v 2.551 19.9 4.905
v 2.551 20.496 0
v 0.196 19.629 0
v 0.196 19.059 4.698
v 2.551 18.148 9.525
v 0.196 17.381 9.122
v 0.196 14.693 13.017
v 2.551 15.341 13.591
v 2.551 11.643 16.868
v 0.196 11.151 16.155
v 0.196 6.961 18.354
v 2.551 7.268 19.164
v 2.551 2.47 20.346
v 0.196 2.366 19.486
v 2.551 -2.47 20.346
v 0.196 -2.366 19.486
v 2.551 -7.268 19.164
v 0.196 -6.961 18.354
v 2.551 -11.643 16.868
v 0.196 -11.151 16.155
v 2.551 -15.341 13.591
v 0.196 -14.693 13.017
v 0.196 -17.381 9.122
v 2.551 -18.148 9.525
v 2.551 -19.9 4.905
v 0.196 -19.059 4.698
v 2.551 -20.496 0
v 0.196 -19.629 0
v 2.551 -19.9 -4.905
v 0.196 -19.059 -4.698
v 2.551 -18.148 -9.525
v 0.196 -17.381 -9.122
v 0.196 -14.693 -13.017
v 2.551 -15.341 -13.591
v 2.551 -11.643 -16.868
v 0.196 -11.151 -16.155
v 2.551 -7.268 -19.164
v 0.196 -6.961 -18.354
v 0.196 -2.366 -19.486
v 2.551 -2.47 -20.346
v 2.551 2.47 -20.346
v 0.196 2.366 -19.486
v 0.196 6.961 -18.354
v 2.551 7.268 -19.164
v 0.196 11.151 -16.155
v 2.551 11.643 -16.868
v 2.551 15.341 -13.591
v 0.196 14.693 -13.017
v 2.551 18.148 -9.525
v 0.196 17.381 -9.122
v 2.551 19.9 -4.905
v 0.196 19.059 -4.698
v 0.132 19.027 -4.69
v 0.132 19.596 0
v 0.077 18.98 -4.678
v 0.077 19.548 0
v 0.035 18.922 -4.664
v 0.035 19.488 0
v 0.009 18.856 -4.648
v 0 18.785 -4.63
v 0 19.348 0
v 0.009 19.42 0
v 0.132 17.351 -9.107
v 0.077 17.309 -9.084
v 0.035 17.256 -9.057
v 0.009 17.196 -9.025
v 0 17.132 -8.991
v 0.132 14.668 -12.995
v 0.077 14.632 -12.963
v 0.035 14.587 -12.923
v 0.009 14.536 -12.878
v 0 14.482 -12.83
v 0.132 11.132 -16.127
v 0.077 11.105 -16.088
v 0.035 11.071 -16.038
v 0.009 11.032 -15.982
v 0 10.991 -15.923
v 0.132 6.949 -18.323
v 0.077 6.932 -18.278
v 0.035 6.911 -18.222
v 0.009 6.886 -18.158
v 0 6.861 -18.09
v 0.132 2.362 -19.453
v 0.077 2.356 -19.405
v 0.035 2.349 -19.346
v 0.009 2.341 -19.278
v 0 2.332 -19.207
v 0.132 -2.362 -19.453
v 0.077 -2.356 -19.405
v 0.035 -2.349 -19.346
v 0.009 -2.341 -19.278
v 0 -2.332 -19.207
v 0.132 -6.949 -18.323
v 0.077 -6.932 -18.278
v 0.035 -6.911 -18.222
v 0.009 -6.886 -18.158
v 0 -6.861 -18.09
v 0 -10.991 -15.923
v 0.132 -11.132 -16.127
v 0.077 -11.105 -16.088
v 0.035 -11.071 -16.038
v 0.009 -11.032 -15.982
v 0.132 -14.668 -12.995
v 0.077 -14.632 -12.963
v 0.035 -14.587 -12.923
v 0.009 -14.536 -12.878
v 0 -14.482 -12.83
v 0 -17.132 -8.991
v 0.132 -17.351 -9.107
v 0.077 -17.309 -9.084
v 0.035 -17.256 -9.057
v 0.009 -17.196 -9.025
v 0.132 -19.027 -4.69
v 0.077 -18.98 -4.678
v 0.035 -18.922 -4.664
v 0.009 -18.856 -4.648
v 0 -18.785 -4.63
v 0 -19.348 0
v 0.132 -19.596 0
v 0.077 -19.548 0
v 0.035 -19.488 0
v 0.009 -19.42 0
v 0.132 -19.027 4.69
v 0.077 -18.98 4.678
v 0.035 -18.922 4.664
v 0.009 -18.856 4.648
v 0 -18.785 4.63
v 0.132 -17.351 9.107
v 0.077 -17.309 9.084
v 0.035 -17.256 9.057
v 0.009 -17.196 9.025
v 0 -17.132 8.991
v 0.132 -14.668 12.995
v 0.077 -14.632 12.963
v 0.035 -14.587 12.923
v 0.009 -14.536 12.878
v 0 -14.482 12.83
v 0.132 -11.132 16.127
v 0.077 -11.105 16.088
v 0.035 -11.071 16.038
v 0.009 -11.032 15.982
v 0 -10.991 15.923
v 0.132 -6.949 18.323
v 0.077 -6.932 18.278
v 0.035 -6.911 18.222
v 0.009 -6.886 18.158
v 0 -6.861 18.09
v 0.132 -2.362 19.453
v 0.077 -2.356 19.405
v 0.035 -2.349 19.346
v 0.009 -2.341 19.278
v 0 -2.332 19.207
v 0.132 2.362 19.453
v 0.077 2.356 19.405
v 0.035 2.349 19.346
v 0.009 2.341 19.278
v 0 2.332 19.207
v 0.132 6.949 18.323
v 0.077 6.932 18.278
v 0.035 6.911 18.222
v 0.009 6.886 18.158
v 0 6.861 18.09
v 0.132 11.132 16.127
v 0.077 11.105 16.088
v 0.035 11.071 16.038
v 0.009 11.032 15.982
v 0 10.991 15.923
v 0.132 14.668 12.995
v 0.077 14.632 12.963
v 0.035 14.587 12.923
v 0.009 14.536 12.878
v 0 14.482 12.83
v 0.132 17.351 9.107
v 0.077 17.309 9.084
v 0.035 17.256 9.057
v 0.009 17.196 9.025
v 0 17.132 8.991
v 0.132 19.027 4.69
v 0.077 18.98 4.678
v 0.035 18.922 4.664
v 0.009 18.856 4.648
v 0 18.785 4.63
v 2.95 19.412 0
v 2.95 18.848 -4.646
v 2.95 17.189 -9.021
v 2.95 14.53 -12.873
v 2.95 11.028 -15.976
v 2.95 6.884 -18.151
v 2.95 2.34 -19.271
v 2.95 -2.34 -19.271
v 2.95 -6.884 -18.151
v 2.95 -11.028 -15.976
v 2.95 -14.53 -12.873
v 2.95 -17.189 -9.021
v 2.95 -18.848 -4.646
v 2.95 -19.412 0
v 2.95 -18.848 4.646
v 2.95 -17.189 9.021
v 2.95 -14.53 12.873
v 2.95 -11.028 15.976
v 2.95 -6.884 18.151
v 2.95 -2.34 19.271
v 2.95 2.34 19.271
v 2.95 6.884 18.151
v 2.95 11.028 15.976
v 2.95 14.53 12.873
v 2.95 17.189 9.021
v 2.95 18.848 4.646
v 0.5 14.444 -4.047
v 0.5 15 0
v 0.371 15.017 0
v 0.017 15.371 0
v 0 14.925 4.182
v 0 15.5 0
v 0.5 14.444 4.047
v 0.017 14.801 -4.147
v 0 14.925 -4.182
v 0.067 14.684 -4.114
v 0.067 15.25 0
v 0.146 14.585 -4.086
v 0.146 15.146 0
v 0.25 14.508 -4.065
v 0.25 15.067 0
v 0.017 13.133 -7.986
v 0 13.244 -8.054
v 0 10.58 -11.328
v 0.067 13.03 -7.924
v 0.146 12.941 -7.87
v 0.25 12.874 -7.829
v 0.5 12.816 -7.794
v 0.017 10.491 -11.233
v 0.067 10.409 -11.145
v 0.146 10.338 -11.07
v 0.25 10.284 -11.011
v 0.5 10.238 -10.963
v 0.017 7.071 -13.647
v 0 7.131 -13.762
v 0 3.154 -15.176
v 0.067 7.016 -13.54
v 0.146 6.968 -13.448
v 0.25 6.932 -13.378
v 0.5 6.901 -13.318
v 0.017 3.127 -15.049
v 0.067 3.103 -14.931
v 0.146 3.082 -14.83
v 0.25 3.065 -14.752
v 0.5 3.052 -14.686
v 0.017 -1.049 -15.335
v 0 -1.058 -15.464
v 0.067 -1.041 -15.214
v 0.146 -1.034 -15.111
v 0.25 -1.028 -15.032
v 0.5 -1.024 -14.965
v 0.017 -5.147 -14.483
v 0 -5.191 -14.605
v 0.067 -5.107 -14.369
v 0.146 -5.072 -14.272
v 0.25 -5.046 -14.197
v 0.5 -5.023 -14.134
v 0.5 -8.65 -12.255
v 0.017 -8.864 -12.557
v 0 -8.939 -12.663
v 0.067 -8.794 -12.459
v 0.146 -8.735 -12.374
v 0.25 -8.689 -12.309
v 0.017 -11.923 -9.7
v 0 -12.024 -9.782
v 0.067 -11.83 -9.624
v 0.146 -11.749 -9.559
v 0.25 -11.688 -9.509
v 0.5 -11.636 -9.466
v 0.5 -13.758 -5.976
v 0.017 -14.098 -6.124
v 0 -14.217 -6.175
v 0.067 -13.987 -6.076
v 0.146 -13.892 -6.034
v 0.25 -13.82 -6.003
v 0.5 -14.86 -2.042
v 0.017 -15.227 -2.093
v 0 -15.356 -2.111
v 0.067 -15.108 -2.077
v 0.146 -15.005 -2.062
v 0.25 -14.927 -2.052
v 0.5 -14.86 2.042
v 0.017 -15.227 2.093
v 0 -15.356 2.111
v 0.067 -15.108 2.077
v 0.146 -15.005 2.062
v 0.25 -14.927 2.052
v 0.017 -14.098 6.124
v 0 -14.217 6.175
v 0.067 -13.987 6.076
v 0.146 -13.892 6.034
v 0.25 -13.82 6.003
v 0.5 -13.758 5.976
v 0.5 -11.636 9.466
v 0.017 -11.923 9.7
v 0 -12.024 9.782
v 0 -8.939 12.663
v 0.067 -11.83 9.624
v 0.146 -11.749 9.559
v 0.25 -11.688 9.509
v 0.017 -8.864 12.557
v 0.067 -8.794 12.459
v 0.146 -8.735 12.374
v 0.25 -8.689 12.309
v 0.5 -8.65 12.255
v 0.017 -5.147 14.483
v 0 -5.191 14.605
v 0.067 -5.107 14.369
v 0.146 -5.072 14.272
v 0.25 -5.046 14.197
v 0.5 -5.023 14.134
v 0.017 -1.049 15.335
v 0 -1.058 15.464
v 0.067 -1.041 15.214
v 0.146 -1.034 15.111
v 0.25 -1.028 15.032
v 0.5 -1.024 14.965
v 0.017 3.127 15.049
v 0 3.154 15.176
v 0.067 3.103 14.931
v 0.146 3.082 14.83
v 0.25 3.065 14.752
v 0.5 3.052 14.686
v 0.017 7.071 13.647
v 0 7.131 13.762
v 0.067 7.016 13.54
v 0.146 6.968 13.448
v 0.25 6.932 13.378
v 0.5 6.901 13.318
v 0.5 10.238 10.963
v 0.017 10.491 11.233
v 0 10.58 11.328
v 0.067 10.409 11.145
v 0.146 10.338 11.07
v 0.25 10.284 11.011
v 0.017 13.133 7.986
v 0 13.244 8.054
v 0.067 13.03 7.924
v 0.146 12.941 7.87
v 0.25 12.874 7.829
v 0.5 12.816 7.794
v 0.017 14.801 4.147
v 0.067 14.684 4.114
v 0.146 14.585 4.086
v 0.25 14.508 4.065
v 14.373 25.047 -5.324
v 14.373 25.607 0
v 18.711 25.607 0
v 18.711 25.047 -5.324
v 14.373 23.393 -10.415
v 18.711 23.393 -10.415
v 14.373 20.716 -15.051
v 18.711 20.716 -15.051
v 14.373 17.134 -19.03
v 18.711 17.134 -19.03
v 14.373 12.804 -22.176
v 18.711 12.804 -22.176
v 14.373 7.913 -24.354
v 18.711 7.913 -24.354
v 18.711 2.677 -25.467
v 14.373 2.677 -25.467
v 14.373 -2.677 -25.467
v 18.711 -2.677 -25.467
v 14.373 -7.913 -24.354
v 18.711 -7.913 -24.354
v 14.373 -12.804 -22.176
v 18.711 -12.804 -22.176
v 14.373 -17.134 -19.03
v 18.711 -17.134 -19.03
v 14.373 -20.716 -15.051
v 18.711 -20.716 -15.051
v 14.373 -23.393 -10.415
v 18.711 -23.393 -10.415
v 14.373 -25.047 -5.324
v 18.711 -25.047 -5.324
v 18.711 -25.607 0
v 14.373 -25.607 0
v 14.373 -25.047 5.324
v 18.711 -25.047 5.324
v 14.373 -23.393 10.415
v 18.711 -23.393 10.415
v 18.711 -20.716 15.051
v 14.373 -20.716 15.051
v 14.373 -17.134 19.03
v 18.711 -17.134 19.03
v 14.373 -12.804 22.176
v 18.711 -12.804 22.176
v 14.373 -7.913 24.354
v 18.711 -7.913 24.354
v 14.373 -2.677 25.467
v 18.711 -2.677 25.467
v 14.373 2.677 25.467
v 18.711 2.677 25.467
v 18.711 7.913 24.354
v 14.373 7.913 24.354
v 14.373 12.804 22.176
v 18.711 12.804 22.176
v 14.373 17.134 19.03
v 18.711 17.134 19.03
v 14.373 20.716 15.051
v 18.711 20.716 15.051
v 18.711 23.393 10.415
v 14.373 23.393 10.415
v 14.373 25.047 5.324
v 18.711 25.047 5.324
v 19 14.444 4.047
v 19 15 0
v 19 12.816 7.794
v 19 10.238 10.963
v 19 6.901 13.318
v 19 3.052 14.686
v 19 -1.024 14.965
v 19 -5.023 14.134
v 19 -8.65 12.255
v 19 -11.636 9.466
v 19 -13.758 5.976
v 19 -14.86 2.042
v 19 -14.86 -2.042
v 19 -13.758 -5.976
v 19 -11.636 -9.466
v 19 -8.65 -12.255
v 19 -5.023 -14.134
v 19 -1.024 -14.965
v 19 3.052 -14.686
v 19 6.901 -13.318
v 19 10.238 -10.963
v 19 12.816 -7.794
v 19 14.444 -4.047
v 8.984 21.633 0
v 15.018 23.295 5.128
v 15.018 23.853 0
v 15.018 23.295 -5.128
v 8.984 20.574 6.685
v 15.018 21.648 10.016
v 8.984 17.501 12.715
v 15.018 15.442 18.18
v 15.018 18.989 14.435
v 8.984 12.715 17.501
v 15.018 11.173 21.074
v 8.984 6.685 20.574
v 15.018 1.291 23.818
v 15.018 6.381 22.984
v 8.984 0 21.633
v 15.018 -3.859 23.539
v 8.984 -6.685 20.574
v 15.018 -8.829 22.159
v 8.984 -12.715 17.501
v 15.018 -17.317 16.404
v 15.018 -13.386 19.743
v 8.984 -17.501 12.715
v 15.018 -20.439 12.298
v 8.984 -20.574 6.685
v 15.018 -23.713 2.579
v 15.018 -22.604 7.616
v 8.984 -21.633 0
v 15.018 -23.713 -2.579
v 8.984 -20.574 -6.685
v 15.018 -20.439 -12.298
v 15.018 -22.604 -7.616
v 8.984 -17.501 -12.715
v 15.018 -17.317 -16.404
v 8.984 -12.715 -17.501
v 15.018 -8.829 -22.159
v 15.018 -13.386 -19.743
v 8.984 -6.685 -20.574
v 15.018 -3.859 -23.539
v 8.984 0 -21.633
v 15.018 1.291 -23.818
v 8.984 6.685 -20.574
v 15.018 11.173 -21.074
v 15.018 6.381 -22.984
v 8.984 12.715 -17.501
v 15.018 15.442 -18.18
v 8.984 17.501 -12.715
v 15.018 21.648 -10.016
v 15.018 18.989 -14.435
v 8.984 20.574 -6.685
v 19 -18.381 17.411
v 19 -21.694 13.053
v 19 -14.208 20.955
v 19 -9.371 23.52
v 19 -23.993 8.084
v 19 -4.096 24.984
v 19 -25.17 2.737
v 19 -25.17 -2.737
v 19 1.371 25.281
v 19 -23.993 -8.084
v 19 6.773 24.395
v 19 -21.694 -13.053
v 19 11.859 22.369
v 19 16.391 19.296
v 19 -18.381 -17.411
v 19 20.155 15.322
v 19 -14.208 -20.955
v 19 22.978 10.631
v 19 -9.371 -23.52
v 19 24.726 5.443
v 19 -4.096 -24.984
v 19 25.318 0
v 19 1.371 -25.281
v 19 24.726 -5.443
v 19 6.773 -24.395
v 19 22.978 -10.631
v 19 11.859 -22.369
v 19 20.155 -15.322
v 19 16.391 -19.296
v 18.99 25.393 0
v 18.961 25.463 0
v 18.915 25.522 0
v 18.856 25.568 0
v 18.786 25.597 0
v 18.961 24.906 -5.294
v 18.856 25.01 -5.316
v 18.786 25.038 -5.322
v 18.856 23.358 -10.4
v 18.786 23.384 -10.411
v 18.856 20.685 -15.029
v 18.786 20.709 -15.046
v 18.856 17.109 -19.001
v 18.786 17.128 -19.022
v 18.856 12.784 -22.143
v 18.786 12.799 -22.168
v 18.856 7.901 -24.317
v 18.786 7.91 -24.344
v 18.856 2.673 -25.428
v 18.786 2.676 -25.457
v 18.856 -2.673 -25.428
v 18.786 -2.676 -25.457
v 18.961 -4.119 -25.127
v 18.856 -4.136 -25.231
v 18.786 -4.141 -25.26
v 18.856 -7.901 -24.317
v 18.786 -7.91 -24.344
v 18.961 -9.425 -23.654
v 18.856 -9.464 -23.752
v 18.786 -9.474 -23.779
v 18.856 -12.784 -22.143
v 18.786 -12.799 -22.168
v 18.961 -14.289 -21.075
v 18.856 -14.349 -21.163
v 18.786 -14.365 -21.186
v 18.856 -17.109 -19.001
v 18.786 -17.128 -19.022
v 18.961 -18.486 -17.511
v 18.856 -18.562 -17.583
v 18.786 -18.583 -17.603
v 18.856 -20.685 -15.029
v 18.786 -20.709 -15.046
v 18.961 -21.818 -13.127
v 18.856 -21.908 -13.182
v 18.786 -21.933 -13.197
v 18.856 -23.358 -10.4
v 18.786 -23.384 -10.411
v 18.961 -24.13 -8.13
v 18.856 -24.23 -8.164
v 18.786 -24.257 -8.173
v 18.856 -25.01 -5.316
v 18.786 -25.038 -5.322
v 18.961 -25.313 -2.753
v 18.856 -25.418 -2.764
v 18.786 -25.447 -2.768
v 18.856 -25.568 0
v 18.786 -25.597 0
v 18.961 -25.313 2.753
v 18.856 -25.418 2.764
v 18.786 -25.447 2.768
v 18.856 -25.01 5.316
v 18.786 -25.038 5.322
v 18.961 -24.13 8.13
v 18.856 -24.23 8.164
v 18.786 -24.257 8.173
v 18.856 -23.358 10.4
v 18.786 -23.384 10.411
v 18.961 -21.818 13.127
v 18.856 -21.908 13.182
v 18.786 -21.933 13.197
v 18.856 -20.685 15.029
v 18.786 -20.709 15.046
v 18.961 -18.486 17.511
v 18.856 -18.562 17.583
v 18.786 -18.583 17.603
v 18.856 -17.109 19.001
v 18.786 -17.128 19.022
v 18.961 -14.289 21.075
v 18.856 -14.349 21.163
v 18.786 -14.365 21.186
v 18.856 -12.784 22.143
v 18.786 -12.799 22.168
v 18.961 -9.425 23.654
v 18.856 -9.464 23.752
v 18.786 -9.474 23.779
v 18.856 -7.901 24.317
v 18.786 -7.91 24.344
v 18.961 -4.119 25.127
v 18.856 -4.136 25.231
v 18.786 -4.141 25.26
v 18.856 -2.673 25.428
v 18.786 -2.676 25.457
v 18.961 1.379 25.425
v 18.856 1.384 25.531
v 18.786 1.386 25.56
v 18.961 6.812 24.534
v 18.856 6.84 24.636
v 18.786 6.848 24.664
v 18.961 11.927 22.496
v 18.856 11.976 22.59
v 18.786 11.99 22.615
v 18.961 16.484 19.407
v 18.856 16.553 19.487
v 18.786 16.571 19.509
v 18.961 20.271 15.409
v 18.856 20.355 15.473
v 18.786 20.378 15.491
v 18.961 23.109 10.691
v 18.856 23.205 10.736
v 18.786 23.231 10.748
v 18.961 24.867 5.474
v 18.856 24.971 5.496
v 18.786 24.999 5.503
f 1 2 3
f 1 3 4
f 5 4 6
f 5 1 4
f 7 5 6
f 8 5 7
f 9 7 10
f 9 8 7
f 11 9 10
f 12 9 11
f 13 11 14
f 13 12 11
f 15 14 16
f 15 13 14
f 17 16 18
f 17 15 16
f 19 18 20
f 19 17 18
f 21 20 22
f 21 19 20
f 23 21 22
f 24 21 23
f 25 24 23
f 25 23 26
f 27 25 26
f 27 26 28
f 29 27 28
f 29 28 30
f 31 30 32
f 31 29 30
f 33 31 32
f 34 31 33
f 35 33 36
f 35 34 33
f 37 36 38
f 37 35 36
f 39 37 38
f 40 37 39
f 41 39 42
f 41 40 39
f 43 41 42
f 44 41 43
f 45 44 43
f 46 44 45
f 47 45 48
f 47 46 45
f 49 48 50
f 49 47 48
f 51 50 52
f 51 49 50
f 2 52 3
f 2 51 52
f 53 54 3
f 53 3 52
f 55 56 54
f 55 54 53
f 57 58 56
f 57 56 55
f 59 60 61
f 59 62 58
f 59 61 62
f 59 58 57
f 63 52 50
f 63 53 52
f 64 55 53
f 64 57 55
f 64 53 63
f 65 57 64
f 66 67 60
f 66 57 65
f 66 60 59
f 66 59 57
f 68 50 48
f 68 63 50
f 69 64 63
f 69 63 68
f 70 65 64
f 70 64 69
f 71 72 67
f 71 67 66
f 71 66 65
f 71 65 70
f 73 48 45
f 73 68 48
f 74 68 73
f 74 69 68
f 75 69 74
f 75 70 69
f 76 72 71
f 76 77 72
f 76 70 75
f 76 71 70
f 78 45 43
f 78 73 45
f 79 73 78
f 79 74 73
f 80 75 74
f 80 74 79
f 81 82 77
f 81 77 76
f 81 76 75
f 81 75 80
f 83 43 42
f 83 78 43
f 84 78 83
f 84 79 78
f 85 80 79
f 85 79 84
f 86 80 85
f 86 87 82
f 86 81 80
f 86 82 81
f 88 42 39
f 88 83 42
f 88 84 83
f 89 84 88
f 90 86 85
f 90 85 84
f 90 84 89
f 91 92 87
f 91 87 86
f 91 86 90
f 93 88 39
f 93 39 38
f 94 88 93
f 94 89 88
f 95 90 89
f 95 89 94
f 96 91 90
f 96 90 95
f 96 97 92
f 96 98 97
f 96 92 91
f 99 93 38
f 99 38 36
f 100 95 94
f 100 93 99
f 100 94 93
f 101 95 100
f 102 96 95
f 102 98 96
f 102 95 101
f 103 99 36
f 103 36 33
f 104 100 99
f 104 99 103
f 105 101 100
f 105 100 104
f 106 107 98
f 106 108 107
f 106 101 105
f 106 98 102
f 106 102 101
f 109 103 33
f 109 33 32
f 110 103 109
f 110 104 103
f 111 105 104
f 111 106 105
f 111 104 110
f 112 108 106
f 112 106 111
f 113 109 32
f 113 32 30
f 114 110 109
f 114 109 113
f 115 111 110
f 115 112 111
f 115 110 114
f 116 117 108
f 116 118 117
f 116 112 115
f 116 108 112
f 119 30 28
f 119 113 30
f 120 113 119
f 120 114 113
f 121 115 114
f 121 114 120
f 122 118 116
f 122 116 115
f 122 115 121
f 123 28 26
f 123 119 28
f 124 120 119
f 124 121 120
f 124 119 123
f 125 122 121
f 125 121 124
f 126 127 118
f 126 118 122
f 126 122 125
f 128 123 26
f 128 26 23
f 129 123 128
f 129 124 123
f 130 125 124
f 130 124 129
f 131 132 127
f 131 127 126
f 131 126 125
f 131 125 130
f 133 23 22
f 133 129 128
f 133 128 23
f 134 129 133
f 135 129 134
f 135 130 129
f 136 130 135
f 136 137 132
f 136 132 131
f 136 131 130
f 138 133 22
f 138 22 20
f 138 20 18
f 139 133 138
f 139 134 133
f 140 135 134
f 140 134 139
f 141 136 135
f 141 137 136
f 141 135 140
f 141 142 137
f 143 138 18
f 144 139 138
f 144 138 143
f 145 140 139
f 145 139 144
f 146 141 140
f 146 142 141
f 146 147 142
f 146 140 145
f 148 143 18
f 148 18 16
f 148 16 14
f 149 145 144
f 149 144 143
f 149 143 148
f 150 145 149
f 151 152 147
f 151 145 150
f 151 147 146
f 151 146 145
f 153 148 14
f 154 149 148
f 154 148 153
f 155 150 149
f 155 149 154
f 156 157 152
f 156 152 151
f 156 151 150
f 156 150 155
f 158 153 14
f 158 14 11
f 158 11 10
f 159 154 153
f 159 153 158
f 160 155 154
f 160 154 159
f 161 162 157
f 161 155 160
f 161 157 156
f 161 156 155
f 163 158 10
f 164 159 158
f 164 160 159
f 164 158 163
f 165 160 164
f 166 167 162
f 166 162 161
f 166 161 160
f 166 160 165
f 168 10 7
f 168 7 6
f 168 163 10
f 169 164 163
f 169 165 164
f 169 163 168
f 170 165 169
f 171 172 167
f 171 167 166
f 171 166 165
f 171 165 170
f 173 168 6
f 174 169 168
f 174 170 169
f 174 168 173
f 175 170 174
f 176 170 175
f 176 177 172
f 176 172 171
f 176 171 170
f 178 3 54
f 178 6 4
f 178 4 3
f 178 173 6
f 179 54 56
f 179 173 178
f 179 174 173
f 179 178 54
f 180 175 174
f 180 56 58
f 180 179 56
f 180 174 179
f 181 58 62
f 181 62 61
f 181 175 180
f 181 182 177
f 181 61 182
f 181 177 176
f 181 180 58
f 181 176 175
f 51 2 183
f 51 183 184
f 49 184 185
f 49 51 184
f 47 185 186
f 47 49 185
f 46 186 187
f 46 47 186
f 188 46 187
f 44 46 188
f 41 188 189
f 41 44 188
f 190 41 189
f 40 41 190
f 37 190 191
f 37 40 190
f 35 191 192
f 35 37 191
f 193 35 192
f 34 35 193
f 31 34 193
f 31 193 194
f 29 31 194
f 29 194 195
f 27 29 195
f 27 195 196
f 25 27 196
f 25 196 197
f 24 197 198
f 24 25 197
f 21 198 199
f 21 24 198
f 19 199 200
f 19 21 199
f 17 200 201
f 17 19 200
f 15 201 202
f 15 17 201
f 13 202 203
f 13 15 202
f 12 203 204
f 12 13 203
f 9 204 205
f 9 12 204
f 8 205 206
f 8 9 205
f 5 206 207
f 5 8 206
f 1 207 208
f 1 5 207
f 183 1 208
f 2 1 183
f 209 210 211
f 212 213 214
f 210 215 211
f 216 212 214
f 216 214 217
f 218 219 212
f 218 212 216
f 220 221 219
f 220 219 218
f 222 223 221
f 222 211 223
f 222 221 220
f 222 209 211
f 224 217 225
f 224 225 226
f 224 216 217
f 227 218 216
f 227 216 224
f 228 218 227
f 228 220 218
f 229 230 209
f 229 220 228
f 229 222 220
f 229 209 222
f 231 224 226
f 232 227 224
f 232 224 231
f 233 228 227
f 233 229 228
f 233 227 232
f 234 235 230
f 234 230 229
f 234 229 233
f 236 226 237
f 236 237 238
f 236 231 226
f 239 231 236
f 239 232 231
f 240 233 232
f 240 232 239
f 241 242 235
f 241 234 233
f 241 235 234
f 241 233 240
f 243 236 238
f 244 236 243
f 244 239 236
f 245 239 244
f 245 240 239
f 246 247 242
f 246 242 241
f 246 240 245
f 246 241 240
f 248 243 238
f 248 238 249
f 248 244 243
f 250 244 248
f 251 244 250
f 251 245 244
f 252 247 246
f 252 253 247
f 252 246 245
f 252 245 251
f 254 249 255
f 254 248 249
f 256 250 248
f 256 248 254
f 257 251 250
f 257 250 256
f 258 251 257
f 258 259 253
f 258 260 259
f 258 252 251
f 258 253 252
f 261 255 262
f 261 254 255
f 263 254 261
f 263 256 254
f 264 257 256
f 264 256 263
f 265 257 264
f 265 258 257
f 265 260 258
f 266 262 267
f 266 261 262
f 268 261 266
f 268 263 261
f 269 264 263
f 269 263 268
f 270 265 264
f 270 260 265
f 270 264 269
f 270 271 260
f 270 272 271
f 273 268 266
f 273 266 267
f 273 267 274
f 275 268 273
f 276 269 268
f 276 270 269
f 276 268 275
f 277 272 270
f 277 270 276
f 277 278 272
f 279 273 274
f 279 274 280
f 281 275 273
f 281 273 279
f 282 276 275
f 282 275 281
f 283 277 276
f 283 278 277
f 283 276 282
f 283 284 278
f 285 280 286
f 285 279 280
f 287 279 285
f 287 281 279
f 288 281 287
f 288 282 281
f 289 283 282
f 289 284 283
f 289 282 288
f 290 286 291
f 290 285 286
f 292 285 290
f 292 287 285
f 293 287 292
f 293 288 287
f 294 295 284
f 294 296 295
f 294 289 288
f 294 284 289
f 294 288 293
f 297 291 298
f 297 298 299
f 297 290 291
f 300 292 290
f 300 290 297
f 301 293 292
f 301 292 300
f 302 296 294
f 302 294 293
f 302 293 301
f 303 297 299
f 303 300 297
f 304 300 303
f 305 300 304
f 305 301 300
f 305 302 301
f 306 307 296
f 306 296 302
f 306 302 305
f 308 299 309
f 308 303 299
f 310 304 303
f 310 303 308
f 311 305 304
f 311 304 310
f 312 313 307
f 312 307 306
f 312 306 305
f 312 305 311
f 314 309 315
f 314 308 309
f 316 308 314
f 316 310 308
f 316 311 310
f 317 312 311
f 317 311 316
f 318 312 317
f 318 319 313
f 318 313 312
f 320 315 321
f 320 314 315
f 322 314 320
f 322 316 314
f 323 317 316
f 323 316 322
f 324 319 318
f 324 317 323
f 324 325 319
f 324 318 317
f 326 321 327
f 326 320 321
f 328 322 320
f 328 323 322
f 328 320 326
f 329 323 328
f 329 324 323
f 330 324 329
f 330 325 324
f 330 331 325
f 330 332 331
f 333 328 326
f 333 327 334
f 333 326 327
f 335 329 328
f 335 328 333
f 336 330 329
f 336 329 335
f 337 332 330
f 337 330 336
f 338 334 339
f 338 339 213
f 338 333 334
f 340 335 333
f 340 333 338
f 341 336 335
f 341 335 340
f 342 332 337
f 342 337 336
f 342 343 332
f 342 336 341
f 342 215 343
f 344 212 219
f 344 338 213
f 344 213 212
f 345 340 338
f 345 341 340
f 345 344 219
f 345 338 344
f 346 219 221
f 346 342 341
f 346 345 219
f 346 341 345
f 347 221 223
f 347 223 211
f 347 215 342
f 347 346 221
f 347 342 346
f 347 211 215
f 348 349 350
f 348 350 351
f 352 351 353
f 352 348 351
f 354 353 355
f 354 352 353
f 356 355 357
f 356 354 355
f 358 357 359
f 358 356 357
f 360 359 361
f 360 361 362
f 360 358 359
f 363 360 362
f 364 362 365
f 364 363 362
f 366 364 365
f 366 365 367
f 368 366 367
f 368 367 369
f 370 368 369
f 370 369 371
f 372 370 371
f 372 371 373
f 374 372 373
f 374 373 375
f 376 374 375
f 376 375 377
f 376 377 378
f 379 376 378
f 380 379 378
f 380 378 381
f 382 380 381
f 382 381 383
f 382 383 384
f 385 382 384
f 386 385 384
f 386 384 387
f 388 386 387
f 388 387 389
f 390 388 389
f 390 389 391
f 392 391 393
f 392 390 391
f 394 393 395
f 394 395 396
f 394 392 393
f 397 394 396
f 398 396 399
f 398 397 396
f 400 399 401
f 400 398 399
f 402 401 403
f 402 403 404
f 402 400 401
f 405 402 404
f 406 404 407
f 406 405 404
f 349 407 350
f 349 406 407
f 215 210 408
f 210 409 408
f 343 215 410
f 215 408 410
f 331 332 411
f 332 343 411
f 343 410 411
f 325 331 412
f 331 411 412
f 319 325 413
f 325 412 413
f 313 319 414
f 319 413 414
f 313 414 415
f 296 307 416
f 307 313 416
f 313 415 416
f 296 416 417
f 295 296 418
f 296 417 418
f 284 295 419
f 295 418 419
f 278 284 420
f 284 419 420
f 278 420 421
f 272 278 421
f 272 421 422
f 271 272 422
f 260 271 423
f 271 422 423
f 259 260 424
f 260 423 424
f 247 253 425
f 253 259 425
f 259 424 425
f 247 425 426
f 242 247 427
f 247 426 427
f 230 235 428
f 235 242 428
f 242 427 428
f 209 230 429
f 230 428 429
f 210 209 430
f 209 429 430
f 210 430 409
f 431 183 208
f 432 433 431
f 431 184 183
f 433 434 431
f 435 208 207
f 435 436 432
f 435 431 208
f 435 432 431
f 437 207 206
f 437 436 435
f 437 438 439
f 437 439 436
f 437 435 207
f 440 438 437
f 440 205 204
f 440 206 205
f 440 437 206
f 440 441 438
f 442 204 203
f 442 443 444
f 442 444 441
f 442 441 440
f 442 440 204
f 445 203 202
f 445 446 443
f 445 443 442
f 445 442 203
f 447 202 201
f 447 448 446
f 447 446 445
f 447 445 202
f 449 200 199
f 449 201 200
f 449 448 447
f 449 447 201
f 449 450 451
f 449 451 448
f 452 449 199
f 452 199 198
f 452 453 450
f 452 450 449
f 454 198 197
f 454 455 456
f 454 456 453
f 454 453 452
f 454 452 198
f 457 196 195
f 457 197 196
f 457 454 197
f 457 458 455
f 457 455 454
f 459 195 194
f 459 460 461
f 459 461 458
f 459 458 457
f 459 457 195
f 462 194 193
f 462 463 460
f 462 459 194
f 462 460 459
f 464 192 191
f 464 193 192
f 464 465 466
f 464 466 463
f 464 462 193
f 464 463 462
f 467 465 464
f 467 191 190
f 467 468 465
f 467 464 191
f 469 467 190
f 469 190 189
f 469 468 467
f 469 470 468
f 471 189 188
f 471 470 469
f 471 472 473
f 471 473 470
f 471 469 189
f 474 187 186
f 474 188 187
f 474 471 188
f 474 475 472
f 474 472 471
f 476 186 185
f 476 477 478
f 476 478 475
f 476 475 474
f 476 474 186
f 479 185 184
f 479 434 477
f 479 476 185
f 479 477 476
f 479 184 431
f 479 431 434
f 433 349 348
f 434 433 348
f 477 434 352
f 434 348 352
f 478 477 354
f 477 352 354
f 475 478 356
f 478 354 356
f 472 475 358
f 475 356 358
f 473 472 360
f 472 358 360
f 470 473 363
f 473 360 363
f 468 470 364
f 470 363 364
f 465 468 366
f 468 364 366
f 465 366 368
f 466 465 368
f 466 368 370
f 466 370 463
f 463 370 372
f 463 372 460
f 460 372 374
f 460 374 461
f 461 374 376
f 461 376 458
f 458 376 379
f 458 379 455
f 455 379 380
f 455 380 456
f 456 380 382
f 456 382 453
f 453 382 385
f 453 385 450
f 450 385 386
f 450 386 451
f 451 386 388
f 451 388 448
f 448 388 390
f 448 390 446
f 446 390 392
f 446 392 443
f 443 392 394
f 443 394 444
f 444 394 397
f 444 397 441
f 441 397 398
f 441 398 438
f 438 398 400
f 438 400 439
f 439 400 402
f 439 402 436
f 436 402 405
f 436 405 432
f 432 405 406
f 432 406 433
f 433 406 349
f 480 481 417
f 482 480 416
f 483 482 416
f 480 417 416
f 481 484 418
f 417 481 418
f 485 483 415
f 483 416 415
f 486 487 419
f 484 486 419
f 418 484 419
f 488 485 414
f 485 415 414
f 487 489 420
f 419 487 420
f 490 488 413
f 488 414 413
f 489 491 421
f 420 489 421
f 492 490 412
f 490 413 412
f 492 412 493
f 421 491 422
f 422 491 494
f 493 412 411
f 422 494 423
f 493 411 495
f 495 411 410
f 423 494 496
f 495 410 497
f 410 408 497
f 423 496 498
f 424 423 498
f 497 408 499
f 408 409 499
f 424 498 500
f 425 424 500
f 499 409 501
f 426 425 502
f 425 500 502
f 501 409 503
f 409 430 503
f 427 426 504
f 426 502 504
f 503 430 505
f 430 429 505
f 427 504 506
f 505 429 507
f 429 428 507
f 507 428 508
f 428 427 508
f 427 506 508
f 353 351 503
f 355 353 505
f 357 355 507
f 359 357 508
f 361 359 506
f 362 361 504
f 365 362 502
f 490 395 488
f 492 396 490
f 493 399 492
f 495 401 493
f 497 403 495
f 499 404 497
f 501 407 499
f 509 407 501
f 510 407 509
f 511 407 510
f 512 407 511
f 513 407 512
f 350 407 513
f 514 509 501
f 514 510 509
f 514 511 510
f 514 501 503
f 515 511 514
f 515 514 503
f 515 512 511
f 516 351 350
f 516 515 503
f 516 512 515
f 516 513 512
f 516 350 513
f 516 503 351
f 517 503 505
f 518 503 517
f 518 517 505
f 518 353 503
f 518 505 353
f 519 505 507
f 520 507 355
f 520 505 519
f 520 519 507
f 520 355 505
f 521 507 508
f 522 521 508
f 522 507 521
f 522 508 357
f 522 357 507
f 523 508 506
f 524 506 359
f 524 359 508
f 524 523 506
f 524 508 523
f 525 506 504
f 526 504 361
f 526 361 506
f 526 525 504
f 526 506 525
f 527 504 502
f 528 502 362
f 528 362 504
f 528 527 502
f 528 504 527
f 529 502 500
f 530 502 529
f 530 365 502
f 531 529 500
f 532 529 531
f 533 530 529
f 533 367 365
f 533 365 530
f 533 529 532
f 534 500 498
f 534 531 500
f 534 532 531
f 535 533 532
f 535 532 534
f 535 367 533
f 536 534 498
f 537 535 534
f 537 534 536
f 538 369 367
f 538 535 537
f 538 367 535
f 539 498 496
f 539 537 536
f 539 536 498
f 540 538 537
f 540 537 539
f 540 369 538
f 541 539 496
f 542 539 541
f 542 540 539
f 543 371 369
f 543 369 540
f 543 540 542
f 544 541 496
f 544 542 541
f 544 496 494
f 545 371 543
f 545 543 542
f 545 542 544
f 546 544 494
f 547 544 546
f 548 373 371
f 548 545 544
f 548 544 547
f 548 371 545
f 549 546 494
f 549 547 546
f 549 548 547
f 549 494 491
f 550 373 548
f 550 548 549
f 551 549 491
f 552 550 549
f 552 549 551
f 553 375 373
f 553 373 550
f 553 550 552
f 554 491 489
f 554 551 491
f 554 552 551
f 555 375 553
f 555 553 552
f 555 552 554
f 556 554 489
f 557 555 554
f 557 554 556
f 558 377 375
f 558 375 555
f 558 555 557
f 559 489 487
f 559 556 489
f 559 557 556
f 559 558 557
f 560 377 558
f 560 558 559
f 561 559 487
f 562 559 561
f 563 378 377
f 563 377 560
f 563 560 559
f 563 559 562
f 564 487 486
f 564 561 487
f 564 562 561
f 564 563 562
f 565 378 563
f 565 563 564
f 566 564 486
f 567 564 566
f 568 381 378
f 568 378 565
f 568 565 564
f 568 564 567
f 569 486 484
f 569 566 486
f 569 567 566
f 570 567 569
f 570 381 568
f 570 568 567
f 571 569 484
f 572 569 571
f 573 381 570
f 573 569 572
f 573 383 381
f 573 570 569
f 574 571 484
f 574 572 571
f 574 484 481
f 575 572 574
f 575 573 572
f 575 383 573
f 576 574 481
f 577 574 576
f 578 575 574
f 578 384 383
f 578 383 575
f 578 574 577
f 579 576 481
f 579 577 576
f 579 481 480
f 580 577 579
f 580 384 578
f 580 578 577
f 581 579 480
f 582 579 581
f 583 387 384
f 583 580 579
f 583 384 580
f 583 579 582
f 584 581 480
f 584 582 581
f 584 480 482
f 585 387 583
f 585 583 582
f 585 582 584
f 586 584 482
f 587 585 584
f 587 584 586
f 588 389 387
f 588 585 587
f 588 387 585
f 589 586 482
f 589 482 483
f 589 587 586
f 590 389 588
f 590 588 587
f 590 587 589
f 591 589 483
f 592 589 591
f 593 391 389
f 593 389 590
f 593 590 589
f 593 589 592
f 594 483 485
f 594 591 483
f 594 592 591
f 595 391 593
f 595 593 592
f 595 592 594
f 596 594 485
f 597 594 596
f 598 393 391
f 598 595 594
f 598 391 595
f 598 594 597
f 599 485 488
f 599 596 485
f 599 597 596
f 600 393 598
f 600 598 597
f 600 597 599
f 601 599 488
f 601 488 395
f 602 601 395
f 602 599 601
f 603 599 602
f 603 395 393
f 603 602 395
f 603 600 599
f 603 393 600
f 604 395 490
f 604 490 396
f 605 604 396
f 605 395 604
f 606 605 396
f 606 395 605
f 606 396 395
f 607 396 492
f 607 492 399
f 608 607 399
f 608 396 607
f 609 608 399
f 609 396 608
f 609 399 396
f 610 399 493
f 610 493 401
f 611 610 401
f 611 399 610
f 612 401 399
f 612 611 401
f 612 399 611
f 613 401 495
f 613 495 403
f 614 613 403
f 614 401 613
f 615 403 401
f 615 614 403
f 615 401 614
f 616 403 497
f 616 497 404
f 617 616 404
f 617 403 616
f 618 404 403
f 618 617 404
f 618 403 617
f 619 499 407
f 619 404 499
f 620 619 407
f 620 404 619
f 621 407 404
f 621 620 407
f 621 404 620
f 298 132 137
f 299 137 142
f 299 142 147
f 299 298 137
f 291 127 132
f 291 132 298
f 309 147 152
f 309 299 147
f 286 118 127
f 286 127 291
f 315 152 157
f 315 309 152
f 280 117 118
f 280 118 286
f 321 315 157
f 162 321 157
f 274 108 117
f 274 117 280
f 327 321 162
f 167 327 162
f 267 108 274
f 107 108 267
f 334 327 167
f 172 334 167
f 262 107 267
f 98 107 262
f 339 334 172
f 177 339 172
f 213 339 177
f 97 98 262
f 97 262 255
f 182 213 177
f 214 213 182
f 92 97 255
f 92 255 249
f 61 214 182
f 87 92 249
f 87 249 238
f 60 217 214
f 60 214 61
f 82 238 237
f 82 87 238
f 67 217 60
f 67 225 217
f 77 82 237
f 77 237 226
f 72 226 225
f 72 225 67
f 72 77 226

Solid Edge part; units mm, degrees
sketch "Sketch1" plane through (0, 0, 0) normal (0, 0, 1) x (1, 0, 0)
  arc A0 (0, 15.5) -> (0.5, 15) centre (0.5, 15.5) ccw
  line L0 (0.5, 15) -> (19, 15)
  line L1 (19, 15) -> (19, 25.318)
  arc A1 (19, 25.318) -> (18.711, 25.607) centre (18.711, 25.318) ccw
  line L2 (18.711, 25.607) -> (14.373, 25.607)
  line L3 (14.373, 25.607) -> (15.0184, 23.853)
  line L4 (15.0184, 23.853) -> (2.95, 19.4124)
  line L5 (2.95, 19.4124) -> (2.5514, 20.4958)
  line L6 (2.5514, 20.4958) -> (0.1964, 19.6293)
  arc A2 (0.1964, 19.6293) -> (0, 19.3477) centre (0.3, 19.3477) ccw
  line L7 (0, 19.3477) -> (0, 15.5)
revolve "RevolvedProtrusion1" add sketch "Sketch1" angle 360 about axis through (50, 0, 0) along (-1, 0, 0)
